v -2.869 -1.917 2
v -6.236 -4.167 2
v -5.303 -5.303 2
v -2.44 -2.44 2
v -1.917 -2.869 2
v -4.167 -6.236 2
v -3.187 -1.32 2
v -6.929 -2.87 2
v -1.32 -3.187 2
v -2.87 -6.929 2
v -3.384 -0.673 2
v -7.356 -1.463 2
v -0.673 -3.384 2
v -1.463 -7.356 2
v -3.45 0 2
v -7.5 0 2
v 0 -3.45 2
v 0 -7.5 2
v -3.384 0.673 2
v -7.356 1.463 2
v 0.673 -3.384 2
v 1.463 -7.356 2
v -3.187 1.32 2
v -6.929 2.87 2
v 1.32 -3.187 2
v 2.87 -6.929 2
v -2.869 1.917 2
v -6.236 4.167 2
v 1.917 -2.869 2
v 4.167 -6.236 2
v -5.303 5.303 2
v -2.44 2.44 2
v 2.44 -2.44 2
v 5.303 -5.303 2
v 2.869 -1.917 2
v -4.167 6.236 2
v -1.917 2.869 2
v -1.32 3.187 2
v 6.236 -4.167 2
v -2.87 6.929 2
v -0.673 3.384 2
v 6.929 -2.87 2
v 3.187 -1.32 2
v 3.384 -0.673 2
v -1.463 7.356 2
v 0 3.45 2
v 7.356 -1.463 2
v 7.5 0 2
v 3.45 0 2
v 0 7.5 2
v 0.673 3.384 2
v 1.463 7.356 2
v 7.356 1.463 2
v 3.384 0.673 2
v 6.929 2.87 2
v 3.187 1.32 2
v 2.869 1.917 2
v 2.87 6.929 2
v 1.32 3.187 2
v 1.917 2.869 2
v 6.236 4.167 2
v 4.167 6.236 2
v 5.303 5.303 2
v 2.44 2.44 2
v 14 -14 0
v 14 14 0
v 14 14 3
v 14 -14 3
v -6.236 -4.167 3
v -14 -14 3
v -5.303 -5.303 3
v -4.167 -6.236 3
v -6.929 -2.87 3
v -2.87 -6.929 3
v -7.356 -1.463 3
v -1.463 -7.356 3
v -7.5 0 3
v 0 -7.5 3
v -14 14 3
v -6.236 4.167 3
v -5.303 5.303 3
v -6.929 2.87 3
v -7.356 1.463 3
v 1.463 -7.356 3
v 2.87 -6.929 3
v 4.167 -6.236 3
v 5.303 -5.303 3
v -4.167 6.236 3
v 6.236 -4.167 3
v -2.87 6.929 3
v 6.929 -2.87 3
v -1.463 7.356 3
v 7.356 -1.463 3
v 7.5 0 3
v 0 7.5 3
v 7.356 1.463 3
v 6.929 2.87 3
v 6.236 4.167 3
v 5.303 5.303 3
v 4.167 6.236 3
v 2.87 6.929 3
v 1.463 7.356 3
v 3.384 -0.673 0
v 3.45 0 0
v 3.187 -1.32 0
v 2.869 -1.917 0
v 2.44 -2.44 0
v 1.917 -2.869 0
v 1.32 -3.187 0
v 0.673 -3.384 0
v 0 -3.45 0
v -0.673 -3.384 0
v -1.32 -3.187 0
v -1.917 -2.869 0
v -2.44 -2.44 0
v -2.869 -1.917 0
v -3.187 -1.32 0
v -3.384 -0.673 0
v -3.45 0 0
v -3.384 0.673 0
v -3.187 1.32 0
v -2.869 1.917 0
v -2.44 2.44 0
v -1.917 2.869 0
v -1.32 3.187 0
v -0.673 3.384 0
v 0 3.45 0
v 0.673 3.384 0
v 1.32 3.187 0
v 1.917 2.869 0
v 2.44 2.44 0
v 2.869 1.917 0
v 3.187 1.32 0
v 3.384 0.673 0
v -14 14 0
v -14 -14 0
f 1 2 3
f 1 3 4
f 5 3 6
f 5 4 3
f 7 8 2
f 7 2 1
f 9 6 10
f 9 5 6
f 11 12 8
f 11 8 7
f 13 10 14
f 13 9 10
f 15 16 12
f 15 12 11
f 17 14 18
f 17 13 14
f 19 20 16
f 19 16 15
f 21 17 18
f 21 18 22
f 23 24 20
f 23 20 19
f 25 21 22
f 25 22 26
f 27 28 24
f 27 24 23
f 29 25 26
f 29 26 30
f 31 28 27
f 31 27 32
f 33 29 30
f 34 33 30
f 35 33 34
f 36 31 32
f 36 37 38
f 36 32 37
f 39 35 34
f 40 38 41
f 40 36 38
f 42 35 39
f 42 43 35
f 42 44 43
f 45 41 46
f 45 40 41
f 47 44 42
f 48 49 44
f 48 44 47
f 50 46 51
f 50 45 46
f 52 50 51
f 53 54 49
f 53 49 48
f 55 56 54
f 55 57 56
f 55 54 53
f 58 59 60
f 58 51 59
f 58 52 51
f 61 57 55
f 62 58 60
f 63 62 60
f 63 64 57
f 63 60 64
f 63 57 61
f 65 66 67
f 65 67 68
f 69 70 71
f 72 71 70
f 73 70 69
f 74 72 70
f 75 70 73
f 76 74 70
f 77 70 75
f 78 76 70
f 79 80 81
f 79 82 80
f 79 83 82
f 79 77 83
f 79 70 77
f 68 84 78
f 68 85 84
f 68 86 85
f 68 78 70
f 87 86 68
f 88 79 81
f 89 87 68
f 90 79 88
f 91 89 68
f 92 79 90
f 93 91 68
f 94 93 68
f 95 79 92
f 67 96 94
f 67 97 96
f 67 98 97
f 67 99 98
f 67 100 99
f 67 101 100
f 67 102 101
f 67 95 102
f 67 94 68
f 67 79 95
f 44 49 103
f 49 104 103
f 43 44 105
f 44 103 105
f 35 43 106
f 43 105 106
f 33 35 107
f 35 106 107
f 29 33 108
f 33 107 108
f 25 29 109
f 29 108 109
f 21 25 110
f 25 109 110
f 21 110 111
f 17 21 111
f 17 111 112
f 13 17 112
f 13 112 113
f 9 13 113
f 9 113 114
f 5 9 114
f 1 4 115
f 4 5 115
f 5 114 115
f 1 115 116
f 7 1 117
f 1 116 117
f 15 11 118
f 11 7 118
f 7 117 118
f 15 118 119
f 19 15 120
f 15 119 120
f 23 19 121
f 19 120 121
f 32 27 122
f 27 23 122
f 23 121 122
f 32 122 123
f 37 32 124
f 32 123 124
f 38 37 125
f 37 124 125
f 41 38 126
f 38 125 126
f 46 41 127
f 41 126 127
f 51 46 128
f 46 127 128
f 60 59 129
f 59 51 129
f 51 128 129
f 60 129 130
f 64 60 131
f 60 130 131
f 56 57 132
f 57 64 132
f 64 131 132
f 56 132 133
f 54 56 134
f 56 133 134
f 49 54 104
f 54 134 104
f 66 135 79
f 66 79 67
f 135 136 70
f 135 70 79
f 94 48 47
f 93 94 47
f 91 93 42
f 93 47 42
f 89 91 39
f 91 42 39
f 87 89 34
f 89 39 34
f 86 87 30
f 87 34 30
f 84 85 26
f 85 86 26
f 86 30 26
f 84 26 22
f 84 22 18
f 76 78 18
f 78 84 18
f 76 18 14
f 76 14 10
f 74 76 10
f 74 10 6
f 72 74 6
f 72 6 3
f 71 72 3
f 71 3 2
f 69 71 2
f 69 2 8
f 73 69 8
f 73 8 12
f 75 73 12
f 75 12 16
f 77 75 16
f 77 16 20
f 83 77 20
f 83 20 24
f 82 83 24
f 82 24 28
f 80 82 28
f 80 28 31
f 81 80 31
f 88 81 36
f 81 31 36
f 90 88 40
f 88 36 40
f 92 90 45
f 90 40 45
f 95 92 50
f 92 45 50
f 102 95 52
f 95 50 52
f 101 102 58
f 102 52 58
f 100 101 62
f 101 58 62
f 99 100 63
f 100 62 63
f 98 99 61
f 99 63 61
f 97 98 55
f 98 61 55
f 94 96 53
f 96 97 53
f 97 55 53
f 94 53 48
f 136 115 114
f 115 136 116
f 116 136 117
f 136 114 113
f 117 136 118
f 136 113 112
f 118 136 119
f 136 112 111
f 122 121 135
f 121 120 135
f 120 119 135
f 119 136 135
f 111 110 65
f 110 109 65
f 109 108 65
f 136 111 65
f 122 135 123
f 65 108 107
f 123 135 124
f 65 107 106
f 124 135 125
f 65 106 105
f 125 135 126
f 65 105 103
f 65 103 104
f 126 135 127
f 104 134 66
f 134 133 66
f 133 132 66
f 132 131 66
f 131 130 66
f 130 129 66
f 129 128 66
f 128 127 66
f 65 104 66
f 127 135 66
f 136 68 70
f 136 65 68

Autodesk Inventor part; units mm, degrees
ref_plane "YZ Plane" through (0, 0, 0) normal (1, 0, 0) x (0, 1, 0)
ref_plane "XZ Plane" through (0, 0, 0) normal (0, 1, 0) x (-1, 0, 0)
ref_plane "XY Plane" through (0, 0, 0) normal (0, 0, 1) x (1, 0, 0)
sketch "スケッチ1" plane through (0, 0, 0) normal (0, 0, 1) x (1, 0, 0)
  circle A0 centre (0, 0) radius 3.45
  circle A1 centre (0, 0) radius 7.5
  line L0 (-14, 14) -> (14, 14)
  line L1 (14, 14) -> (14, -14)
  line L2 (14, -14) -> (-14, -14)
  line L3 (-14, -14) -> (-14, 14)
  line L4 (-14, 14) -> (14, -14) construction
  line L5 (14, 14) -> (-14, -14) construction
  dimension "d0" = 6.9
  dimension "d1" = 15
  dimension "d2" = 28
  dimension "d3" = 28
extrude "押し出し1" add sketch "スケッチ1" along normal blind 3 contours L0 L1 L2 L3
extrude "押し出し2" add sketch "スケッチ1" along normal blind 2 contours A1
equation "\"d3\" = d2"
properties part number "baicPart"
